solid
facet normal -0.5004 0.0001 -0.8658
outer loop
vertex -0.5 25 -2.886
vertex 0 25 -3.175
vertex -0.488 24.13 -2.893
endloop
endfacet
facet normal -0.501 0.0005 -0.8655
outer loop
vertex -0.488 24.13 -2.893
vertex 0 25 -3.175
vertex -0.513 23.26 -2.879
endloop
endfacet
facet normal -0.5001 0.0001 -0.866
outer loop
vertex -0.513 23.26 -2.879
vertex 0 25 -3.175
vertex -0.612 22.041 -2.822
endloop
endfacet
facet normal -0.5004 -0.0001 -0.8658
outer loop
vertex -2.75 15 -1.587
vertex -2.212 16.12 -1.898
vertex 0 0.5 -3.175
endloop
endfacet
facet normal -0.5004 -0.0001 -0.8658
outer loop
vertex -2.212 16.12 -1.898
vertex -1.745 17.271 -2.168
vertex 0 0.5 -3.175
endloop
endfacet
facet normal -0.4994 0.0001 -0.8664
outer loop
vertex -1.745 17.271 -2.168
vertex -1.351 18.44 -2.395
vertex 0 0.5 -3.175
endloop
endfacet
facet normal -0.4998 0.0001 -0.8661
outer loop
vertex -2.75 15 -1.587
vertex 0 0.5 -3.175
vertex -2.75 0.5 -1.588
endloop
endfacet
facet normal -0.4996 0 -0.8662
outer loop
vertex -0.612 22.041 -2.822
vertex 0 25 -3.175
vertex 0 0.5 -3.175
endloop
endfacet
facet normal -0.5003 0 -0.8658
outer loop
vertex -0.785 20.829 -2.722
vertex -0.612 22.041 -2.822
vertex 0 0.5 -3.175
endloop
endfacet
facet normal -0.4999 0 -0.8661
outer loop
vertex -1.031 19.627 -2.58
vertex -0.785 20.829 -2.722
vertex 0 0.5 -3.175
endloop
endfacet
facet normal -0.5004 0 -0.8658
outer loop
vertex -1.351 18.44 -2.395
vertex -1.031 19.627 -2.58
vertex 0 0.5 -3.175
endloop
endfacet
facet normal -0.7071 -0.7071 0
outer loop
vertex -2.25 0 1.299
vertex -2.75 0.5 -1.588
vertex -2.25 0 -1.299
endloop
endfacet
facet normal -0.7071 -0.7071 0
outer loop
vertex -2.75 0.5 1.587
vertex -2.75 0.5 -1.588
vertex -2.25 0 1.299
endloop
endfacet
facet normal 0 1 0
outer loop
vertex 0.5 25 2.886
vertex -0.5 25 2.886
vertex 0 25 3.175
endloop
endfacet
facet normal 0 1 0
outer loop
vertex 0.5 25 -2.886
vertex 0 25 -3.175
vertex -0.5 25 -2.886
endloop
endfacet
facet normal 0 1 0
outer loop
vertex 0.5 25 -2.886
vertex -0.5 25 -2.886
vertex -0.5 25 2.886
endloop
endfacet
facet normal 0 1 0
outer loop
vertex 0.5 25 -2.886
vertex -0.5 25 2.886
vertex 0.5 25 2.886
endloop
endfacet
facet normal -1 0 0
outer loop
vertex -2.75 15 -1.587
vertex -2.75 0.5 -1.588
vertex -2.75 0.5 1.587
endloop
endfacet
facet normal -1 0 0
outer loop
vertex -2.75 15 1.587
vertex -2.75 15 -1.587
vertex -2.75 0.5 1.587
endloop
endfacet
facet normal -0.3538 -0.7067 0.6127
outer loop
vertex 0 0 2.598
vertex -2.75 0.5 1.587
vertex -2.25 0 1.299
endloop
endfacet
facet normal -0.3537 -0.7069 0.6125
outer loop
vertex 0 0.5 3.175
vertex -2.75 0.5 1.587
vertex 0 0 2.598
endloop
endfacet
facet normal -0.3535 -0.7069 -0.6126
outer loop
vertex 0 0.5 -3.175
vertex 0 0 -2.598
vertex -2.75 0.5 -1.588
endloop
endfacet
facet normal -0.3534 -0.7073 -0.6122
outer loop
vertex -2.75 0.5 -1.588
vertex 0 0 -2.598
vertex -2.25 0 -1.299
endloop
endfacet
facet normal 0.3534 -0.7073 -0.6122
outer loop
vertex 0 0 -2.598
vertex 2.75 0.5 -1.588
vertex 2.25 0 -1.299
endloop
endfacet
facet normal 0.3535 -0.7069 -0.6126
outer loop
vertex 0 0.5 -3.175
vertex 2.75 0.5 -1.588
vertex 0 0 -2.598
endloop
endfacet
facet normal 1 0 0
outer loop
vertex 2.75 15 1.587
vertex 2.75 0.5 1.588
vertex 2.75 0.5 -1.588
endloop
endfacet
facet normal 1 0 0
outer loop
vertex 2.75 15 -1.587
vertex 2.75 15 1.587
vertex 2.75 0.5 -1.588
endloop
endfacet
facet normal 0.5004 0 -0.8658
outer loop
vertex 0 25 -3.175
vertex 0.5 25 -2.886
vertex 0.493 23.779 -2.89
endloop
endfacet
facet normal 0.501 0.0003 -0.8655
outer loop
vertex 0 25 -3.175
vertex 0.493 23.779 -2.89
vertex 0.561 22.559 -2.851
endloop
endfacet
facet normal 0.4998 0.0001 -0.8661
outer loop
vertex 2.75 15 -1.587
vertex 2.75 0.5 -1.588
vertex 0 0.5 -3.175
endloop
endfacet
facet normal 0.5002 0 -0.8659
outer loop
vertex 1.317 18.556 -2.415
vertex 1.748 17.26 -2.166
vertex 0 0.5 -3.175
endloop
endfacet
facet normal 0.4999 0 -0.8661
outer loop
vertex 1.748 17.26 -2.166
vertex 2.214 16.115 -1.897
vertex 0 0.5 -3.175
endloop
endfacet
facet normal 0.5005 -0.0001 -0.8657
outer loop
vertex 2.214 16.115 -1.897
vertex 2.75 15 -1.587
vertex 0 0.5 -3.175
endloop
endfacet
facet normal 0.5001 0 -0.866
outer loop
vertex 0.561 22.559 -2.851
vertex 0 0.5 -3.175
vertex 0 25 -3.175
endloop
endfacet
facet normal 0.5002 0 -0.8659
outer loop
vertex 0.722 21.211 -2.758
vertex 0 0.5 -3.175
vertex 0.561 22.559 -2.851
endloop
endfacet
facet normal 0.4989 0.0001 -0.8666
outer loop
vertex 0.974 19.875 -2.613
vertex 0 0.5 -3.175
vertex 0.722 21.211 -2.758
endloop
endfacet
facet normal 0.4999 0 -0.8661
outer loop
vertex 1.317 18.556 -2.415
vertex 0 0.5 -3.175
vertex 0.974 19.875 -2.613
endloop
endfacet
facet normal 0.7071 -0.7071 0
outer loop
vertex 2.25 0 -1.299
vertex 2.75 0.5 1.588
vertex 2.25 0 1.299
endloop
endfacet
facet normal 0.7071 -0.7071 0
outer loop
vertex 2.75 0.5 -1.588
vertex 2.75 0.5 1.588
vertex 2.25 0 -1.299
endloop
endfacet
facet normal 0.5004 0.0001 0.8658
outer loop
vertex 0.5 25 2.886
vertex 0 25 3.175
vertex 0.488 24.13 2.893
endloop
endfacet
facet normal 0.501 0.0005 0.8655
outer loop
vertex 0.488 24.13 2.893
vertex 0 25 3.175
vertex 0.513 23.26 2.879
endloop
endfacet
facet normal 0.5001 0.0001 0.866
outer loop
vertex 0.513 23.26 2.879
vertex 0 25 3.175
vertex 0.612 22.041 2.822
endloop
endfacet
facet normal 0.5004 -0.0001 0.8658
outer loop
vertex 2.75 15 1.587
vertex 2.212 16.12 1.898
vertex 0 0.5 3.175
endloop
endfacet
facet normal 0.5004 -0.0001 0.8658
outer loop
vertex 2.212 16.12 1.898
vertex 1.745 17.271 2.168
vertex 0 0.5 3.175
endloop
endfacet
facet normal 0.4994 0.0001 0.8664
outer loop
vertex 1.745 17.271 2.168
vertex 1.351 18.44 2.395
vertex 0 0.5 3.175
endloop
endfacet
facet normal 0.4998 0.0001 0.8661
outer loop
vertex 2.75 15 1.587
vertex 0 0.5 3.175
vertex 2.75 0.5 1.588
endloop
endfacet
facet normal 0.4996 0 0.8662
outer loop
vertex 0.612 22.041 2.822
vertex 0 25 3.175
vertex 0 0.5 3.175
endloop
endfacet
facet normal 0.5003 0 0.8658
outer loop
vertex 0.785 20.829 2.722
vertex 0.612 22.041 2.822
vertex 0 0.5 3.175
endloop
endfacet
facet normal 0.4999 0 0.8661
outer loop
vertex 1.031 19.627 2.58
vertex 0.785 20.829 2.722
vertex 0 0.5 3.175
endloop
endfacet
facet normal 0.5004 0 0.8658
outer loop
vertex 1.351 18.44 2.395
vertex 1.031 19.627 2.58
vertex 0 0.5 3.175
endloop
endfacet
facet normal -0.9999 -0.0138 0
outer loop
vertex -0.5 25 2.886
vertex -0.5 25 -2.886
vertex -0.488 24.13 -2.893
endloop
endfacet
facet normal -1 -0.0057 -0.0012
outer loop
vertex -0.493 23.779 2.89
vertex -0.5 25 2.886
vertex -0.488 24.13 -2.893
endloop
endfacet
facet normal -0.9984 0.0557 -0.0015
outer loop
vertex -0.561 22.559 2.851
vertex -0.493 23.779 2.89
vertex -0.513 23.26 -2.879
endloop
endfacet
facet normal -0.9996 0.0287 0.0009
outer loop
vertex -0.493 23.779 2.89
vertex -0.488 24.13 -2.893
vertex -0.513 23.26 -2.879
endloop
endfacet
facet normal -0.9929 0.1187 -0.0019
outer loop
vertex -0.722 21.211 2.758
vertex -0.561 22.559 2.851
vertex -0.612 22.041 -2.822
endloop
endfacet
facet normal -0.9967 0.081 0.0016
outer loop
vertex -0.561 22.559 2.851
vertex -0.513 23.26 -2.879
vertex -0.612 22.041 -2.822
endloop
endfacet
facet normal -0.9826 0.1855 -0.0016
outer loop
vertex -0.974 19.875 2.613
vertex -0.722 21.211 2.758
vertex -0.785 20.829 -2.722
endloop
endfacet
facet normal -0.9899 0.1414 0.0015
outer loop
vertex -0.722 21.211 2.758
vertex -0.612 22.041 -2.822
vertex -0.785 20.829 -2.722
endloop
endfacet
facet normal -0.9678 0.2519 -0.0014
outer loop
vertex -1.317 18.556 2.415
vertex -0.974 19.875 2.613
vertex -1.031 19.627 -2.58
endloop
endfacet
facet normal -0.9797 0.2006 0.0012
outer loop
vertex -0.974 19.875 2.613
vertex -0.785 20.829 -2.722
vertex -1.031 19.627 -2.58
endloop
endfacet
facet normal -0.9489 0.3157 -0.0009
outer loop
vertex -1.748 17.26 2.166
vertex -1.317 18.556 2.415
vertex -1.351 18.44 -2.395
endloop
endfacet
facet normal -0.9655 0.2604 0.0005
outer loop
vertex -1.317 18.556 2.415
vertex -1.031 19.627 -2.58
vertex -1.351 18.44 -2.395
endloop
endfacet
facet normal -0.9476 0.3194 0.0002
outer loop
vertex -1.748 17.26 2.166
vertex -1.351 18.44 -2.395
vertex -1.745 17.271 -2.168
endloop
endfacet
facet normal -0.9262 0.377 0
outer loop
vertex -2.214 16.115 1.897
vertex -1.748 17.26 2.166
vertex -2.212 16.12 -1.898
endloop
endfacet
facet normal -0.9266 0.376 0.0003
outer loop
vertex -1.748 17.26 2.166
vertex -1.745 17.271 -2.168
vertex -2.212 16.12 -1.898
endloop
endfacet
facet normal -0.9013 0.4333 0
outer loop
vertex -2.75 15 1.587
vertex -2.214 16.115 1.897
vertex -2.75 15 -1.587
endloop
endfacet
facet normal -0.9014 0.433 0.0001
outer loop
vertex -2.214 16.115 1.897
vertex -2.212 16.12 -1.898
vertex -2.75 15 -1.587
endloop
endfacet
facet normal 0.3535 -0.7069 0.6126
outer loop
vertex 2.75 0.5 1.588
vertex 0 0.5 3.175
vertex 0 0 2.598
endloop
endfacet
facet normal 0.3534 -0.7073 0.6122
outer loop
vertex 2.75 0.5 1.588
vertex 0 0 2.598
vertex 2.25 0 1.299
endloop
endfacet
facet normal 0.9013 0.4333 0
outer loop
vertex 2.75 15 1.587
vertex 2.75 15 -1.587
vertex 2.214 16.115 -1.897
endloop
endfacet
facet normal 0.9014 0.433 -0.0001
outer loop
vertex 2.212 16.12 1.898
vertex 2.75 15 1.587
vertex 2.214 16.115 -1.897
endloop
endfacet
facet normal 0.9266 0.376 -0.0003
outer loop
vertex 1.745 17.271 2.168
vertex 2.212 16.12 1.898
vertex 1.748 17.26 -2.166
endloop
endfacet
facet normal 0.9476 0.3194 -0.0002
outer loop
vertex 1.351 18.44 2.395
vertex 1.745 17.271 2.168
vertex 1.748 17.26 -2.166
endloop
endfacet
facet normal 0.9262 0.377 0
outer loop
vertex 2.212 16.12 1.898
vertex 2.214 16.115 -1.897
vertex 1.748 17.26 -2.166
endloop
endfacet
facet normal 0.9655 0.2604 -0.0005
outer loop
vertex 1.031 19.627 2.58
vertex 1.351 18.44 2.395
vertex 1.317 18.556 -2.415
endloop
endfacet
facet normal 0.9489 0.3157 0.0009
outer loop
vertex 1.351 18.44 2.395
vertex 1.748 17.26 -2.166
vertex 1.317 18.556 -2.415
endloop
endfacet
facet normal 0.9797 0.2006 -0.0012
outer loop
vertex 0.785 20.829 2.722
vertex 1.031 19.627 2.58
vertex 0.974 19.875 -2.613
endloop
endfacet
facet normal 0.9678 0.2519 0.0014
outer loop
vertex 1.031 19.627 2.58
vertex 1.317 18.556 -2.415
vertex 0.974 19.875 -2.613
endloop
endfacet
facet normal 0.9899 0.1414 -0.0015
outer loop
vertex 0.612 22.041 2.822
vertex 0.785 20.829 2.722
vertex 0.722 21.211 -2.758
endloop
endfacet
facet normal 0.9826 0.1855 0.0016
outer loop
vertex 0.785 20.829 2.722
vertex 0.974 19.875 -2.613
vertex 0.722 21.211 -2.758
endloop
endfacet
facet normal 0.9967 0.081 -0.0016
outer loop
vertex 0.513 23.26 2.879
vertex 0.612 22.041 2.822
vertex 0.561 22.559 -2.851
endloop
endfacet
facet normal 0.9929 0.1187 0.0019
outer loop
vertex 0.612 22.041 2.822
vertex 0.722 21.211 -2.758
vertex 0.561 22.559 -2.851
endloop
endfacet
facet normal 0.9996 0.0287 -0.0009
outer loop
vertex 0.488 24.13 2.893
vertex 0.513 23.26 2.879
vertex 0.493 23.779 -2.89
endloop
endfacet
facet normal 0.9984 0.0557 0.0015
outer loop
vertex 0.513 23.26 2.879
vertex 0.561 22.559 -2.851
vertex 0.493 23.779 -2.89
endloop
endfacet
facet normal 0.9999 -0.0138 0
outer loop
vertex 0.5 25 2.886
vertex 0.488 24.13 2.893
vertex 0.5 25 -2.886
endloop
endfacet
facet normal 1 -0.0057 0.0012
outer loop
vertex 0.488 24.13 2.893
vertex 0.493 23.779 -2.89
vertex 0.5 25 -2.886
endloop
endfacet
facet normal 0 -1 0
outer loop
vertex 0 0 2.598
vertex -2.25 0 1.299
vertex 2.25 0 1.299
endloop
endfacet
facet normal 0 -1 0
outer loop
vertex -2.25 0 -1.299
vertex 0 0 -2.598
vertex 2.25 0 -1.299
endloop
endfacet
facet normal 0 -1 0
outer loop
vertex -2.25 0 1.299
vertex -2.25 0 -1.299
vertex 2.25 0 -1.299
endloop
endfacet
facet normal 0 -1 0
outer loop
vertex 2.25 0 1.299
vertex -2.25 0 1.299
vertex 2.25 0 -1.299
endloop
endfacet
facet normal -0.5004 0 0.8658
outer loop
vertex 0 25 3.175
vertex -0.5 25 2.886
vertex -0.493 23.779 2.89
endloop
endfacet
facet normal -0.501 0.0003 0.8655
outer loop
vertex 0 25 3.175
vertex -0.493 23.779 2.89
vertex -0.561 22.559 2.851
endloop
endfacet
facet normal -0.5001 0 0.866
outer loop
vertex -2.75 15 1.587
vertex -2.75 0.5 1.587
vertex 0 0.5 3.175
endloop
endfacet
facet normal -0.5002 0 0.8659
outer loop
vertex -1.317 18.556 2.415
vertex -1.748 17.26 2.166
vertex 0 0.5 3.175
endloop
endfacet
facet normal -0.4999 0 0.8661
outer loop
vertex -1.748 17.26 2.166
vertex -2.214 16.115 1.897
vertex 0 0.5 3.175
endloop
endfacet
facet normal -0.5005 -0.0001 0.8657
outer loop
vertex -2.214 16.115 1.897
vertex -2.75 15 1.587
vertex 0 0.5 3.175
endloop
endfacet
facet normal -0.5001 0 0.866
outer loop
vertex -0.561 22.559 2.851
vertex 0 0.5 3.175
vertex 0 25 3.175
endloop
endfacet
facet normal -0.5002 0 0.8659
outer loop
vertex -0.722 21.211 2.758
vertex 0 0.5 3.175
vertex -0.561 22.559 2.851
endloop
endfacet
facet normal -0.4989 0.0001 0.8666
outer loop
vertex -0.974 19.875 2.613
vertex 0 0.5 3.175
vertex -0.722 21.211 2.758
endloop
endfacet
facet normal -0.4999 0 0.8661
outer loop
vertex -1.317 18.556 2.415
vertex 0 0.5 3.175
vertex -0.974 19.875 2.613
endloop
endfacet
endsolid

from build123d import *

# Parameters (mm, degrees)
BOSS_EXTRUDE1_DEPTH     = 25
CUT_EXTRUDE1_DEPTH      = 26.350366738
CUT_EXTRUDE1_DEPTH_BACK = 26.350366738
CHAMFER1_SIZE           = 0.5


with BuildPart() as part:
    # Sketch1 → Boss-Extrude1 (new body)
    with BuildSketch(Plane(origin=(0, 0, 0), x_dir=(1, 0, 0), z_dir=(0, 1, 0))):
        Polygon((0, 3.175), (-2.749630657, 1.5875), (-2.749630657, -1.5875), (0, -3.175), (2.749630657, -1.5875), (2.749630657, 1.5875), align=None)
    extrude(amount=BOSS_EXTRUDE1_DEPTH)

    # Sketch2 → Cut-Extrude1 (cut, two sides: drawn at the far end of the back side and taken through both)
    with BuildSketch(Plane.XY.offset(-CUT_EXTRUDE1_DEPTH_BACK)):
        with BuildLine():
            Line((-2.749630657, 25), (-0.5, 25))
            ThreePointArc((-0.5, 25), (-0.978721639, 19.854652783), (-2.749630657, 15))
            Line((-2.749630657, 15), (-2.749630657, 25))
        make_face()
        with BuildLine():
            Line((0.5, 25), (2.749630657, 25))
            Line((2.749630657, 25), (2.749630657, 15))
            ThreePointArc((2.749630657, 15), (0.978721639, 19.854652783), (0.5, 25))
        make_face()
    extrude(amount=CUT_EXTRUDE1_DEPTH + CUT_EXTRUDE1_DEPTH_BACK, mode=Mode.SUBTRACT)

    # Chamfer1
    chamfer1_edges = [part.edges().sort_by_distance(p)[0] for p in [
        (2.749630657, 0, 0),
        (1.374815329, 0, 2.38125),
        (-1.374815329, 0, 2.38125),
        (-2.749630657, 0, 0),
        (-1.374815329, 0, -2.38125),
        (1.374815329, 0, -2.38125),
    ]]
    chamfer(chamfer1_edges, length=CHAMFER1_SIZE)


solid = part.part
